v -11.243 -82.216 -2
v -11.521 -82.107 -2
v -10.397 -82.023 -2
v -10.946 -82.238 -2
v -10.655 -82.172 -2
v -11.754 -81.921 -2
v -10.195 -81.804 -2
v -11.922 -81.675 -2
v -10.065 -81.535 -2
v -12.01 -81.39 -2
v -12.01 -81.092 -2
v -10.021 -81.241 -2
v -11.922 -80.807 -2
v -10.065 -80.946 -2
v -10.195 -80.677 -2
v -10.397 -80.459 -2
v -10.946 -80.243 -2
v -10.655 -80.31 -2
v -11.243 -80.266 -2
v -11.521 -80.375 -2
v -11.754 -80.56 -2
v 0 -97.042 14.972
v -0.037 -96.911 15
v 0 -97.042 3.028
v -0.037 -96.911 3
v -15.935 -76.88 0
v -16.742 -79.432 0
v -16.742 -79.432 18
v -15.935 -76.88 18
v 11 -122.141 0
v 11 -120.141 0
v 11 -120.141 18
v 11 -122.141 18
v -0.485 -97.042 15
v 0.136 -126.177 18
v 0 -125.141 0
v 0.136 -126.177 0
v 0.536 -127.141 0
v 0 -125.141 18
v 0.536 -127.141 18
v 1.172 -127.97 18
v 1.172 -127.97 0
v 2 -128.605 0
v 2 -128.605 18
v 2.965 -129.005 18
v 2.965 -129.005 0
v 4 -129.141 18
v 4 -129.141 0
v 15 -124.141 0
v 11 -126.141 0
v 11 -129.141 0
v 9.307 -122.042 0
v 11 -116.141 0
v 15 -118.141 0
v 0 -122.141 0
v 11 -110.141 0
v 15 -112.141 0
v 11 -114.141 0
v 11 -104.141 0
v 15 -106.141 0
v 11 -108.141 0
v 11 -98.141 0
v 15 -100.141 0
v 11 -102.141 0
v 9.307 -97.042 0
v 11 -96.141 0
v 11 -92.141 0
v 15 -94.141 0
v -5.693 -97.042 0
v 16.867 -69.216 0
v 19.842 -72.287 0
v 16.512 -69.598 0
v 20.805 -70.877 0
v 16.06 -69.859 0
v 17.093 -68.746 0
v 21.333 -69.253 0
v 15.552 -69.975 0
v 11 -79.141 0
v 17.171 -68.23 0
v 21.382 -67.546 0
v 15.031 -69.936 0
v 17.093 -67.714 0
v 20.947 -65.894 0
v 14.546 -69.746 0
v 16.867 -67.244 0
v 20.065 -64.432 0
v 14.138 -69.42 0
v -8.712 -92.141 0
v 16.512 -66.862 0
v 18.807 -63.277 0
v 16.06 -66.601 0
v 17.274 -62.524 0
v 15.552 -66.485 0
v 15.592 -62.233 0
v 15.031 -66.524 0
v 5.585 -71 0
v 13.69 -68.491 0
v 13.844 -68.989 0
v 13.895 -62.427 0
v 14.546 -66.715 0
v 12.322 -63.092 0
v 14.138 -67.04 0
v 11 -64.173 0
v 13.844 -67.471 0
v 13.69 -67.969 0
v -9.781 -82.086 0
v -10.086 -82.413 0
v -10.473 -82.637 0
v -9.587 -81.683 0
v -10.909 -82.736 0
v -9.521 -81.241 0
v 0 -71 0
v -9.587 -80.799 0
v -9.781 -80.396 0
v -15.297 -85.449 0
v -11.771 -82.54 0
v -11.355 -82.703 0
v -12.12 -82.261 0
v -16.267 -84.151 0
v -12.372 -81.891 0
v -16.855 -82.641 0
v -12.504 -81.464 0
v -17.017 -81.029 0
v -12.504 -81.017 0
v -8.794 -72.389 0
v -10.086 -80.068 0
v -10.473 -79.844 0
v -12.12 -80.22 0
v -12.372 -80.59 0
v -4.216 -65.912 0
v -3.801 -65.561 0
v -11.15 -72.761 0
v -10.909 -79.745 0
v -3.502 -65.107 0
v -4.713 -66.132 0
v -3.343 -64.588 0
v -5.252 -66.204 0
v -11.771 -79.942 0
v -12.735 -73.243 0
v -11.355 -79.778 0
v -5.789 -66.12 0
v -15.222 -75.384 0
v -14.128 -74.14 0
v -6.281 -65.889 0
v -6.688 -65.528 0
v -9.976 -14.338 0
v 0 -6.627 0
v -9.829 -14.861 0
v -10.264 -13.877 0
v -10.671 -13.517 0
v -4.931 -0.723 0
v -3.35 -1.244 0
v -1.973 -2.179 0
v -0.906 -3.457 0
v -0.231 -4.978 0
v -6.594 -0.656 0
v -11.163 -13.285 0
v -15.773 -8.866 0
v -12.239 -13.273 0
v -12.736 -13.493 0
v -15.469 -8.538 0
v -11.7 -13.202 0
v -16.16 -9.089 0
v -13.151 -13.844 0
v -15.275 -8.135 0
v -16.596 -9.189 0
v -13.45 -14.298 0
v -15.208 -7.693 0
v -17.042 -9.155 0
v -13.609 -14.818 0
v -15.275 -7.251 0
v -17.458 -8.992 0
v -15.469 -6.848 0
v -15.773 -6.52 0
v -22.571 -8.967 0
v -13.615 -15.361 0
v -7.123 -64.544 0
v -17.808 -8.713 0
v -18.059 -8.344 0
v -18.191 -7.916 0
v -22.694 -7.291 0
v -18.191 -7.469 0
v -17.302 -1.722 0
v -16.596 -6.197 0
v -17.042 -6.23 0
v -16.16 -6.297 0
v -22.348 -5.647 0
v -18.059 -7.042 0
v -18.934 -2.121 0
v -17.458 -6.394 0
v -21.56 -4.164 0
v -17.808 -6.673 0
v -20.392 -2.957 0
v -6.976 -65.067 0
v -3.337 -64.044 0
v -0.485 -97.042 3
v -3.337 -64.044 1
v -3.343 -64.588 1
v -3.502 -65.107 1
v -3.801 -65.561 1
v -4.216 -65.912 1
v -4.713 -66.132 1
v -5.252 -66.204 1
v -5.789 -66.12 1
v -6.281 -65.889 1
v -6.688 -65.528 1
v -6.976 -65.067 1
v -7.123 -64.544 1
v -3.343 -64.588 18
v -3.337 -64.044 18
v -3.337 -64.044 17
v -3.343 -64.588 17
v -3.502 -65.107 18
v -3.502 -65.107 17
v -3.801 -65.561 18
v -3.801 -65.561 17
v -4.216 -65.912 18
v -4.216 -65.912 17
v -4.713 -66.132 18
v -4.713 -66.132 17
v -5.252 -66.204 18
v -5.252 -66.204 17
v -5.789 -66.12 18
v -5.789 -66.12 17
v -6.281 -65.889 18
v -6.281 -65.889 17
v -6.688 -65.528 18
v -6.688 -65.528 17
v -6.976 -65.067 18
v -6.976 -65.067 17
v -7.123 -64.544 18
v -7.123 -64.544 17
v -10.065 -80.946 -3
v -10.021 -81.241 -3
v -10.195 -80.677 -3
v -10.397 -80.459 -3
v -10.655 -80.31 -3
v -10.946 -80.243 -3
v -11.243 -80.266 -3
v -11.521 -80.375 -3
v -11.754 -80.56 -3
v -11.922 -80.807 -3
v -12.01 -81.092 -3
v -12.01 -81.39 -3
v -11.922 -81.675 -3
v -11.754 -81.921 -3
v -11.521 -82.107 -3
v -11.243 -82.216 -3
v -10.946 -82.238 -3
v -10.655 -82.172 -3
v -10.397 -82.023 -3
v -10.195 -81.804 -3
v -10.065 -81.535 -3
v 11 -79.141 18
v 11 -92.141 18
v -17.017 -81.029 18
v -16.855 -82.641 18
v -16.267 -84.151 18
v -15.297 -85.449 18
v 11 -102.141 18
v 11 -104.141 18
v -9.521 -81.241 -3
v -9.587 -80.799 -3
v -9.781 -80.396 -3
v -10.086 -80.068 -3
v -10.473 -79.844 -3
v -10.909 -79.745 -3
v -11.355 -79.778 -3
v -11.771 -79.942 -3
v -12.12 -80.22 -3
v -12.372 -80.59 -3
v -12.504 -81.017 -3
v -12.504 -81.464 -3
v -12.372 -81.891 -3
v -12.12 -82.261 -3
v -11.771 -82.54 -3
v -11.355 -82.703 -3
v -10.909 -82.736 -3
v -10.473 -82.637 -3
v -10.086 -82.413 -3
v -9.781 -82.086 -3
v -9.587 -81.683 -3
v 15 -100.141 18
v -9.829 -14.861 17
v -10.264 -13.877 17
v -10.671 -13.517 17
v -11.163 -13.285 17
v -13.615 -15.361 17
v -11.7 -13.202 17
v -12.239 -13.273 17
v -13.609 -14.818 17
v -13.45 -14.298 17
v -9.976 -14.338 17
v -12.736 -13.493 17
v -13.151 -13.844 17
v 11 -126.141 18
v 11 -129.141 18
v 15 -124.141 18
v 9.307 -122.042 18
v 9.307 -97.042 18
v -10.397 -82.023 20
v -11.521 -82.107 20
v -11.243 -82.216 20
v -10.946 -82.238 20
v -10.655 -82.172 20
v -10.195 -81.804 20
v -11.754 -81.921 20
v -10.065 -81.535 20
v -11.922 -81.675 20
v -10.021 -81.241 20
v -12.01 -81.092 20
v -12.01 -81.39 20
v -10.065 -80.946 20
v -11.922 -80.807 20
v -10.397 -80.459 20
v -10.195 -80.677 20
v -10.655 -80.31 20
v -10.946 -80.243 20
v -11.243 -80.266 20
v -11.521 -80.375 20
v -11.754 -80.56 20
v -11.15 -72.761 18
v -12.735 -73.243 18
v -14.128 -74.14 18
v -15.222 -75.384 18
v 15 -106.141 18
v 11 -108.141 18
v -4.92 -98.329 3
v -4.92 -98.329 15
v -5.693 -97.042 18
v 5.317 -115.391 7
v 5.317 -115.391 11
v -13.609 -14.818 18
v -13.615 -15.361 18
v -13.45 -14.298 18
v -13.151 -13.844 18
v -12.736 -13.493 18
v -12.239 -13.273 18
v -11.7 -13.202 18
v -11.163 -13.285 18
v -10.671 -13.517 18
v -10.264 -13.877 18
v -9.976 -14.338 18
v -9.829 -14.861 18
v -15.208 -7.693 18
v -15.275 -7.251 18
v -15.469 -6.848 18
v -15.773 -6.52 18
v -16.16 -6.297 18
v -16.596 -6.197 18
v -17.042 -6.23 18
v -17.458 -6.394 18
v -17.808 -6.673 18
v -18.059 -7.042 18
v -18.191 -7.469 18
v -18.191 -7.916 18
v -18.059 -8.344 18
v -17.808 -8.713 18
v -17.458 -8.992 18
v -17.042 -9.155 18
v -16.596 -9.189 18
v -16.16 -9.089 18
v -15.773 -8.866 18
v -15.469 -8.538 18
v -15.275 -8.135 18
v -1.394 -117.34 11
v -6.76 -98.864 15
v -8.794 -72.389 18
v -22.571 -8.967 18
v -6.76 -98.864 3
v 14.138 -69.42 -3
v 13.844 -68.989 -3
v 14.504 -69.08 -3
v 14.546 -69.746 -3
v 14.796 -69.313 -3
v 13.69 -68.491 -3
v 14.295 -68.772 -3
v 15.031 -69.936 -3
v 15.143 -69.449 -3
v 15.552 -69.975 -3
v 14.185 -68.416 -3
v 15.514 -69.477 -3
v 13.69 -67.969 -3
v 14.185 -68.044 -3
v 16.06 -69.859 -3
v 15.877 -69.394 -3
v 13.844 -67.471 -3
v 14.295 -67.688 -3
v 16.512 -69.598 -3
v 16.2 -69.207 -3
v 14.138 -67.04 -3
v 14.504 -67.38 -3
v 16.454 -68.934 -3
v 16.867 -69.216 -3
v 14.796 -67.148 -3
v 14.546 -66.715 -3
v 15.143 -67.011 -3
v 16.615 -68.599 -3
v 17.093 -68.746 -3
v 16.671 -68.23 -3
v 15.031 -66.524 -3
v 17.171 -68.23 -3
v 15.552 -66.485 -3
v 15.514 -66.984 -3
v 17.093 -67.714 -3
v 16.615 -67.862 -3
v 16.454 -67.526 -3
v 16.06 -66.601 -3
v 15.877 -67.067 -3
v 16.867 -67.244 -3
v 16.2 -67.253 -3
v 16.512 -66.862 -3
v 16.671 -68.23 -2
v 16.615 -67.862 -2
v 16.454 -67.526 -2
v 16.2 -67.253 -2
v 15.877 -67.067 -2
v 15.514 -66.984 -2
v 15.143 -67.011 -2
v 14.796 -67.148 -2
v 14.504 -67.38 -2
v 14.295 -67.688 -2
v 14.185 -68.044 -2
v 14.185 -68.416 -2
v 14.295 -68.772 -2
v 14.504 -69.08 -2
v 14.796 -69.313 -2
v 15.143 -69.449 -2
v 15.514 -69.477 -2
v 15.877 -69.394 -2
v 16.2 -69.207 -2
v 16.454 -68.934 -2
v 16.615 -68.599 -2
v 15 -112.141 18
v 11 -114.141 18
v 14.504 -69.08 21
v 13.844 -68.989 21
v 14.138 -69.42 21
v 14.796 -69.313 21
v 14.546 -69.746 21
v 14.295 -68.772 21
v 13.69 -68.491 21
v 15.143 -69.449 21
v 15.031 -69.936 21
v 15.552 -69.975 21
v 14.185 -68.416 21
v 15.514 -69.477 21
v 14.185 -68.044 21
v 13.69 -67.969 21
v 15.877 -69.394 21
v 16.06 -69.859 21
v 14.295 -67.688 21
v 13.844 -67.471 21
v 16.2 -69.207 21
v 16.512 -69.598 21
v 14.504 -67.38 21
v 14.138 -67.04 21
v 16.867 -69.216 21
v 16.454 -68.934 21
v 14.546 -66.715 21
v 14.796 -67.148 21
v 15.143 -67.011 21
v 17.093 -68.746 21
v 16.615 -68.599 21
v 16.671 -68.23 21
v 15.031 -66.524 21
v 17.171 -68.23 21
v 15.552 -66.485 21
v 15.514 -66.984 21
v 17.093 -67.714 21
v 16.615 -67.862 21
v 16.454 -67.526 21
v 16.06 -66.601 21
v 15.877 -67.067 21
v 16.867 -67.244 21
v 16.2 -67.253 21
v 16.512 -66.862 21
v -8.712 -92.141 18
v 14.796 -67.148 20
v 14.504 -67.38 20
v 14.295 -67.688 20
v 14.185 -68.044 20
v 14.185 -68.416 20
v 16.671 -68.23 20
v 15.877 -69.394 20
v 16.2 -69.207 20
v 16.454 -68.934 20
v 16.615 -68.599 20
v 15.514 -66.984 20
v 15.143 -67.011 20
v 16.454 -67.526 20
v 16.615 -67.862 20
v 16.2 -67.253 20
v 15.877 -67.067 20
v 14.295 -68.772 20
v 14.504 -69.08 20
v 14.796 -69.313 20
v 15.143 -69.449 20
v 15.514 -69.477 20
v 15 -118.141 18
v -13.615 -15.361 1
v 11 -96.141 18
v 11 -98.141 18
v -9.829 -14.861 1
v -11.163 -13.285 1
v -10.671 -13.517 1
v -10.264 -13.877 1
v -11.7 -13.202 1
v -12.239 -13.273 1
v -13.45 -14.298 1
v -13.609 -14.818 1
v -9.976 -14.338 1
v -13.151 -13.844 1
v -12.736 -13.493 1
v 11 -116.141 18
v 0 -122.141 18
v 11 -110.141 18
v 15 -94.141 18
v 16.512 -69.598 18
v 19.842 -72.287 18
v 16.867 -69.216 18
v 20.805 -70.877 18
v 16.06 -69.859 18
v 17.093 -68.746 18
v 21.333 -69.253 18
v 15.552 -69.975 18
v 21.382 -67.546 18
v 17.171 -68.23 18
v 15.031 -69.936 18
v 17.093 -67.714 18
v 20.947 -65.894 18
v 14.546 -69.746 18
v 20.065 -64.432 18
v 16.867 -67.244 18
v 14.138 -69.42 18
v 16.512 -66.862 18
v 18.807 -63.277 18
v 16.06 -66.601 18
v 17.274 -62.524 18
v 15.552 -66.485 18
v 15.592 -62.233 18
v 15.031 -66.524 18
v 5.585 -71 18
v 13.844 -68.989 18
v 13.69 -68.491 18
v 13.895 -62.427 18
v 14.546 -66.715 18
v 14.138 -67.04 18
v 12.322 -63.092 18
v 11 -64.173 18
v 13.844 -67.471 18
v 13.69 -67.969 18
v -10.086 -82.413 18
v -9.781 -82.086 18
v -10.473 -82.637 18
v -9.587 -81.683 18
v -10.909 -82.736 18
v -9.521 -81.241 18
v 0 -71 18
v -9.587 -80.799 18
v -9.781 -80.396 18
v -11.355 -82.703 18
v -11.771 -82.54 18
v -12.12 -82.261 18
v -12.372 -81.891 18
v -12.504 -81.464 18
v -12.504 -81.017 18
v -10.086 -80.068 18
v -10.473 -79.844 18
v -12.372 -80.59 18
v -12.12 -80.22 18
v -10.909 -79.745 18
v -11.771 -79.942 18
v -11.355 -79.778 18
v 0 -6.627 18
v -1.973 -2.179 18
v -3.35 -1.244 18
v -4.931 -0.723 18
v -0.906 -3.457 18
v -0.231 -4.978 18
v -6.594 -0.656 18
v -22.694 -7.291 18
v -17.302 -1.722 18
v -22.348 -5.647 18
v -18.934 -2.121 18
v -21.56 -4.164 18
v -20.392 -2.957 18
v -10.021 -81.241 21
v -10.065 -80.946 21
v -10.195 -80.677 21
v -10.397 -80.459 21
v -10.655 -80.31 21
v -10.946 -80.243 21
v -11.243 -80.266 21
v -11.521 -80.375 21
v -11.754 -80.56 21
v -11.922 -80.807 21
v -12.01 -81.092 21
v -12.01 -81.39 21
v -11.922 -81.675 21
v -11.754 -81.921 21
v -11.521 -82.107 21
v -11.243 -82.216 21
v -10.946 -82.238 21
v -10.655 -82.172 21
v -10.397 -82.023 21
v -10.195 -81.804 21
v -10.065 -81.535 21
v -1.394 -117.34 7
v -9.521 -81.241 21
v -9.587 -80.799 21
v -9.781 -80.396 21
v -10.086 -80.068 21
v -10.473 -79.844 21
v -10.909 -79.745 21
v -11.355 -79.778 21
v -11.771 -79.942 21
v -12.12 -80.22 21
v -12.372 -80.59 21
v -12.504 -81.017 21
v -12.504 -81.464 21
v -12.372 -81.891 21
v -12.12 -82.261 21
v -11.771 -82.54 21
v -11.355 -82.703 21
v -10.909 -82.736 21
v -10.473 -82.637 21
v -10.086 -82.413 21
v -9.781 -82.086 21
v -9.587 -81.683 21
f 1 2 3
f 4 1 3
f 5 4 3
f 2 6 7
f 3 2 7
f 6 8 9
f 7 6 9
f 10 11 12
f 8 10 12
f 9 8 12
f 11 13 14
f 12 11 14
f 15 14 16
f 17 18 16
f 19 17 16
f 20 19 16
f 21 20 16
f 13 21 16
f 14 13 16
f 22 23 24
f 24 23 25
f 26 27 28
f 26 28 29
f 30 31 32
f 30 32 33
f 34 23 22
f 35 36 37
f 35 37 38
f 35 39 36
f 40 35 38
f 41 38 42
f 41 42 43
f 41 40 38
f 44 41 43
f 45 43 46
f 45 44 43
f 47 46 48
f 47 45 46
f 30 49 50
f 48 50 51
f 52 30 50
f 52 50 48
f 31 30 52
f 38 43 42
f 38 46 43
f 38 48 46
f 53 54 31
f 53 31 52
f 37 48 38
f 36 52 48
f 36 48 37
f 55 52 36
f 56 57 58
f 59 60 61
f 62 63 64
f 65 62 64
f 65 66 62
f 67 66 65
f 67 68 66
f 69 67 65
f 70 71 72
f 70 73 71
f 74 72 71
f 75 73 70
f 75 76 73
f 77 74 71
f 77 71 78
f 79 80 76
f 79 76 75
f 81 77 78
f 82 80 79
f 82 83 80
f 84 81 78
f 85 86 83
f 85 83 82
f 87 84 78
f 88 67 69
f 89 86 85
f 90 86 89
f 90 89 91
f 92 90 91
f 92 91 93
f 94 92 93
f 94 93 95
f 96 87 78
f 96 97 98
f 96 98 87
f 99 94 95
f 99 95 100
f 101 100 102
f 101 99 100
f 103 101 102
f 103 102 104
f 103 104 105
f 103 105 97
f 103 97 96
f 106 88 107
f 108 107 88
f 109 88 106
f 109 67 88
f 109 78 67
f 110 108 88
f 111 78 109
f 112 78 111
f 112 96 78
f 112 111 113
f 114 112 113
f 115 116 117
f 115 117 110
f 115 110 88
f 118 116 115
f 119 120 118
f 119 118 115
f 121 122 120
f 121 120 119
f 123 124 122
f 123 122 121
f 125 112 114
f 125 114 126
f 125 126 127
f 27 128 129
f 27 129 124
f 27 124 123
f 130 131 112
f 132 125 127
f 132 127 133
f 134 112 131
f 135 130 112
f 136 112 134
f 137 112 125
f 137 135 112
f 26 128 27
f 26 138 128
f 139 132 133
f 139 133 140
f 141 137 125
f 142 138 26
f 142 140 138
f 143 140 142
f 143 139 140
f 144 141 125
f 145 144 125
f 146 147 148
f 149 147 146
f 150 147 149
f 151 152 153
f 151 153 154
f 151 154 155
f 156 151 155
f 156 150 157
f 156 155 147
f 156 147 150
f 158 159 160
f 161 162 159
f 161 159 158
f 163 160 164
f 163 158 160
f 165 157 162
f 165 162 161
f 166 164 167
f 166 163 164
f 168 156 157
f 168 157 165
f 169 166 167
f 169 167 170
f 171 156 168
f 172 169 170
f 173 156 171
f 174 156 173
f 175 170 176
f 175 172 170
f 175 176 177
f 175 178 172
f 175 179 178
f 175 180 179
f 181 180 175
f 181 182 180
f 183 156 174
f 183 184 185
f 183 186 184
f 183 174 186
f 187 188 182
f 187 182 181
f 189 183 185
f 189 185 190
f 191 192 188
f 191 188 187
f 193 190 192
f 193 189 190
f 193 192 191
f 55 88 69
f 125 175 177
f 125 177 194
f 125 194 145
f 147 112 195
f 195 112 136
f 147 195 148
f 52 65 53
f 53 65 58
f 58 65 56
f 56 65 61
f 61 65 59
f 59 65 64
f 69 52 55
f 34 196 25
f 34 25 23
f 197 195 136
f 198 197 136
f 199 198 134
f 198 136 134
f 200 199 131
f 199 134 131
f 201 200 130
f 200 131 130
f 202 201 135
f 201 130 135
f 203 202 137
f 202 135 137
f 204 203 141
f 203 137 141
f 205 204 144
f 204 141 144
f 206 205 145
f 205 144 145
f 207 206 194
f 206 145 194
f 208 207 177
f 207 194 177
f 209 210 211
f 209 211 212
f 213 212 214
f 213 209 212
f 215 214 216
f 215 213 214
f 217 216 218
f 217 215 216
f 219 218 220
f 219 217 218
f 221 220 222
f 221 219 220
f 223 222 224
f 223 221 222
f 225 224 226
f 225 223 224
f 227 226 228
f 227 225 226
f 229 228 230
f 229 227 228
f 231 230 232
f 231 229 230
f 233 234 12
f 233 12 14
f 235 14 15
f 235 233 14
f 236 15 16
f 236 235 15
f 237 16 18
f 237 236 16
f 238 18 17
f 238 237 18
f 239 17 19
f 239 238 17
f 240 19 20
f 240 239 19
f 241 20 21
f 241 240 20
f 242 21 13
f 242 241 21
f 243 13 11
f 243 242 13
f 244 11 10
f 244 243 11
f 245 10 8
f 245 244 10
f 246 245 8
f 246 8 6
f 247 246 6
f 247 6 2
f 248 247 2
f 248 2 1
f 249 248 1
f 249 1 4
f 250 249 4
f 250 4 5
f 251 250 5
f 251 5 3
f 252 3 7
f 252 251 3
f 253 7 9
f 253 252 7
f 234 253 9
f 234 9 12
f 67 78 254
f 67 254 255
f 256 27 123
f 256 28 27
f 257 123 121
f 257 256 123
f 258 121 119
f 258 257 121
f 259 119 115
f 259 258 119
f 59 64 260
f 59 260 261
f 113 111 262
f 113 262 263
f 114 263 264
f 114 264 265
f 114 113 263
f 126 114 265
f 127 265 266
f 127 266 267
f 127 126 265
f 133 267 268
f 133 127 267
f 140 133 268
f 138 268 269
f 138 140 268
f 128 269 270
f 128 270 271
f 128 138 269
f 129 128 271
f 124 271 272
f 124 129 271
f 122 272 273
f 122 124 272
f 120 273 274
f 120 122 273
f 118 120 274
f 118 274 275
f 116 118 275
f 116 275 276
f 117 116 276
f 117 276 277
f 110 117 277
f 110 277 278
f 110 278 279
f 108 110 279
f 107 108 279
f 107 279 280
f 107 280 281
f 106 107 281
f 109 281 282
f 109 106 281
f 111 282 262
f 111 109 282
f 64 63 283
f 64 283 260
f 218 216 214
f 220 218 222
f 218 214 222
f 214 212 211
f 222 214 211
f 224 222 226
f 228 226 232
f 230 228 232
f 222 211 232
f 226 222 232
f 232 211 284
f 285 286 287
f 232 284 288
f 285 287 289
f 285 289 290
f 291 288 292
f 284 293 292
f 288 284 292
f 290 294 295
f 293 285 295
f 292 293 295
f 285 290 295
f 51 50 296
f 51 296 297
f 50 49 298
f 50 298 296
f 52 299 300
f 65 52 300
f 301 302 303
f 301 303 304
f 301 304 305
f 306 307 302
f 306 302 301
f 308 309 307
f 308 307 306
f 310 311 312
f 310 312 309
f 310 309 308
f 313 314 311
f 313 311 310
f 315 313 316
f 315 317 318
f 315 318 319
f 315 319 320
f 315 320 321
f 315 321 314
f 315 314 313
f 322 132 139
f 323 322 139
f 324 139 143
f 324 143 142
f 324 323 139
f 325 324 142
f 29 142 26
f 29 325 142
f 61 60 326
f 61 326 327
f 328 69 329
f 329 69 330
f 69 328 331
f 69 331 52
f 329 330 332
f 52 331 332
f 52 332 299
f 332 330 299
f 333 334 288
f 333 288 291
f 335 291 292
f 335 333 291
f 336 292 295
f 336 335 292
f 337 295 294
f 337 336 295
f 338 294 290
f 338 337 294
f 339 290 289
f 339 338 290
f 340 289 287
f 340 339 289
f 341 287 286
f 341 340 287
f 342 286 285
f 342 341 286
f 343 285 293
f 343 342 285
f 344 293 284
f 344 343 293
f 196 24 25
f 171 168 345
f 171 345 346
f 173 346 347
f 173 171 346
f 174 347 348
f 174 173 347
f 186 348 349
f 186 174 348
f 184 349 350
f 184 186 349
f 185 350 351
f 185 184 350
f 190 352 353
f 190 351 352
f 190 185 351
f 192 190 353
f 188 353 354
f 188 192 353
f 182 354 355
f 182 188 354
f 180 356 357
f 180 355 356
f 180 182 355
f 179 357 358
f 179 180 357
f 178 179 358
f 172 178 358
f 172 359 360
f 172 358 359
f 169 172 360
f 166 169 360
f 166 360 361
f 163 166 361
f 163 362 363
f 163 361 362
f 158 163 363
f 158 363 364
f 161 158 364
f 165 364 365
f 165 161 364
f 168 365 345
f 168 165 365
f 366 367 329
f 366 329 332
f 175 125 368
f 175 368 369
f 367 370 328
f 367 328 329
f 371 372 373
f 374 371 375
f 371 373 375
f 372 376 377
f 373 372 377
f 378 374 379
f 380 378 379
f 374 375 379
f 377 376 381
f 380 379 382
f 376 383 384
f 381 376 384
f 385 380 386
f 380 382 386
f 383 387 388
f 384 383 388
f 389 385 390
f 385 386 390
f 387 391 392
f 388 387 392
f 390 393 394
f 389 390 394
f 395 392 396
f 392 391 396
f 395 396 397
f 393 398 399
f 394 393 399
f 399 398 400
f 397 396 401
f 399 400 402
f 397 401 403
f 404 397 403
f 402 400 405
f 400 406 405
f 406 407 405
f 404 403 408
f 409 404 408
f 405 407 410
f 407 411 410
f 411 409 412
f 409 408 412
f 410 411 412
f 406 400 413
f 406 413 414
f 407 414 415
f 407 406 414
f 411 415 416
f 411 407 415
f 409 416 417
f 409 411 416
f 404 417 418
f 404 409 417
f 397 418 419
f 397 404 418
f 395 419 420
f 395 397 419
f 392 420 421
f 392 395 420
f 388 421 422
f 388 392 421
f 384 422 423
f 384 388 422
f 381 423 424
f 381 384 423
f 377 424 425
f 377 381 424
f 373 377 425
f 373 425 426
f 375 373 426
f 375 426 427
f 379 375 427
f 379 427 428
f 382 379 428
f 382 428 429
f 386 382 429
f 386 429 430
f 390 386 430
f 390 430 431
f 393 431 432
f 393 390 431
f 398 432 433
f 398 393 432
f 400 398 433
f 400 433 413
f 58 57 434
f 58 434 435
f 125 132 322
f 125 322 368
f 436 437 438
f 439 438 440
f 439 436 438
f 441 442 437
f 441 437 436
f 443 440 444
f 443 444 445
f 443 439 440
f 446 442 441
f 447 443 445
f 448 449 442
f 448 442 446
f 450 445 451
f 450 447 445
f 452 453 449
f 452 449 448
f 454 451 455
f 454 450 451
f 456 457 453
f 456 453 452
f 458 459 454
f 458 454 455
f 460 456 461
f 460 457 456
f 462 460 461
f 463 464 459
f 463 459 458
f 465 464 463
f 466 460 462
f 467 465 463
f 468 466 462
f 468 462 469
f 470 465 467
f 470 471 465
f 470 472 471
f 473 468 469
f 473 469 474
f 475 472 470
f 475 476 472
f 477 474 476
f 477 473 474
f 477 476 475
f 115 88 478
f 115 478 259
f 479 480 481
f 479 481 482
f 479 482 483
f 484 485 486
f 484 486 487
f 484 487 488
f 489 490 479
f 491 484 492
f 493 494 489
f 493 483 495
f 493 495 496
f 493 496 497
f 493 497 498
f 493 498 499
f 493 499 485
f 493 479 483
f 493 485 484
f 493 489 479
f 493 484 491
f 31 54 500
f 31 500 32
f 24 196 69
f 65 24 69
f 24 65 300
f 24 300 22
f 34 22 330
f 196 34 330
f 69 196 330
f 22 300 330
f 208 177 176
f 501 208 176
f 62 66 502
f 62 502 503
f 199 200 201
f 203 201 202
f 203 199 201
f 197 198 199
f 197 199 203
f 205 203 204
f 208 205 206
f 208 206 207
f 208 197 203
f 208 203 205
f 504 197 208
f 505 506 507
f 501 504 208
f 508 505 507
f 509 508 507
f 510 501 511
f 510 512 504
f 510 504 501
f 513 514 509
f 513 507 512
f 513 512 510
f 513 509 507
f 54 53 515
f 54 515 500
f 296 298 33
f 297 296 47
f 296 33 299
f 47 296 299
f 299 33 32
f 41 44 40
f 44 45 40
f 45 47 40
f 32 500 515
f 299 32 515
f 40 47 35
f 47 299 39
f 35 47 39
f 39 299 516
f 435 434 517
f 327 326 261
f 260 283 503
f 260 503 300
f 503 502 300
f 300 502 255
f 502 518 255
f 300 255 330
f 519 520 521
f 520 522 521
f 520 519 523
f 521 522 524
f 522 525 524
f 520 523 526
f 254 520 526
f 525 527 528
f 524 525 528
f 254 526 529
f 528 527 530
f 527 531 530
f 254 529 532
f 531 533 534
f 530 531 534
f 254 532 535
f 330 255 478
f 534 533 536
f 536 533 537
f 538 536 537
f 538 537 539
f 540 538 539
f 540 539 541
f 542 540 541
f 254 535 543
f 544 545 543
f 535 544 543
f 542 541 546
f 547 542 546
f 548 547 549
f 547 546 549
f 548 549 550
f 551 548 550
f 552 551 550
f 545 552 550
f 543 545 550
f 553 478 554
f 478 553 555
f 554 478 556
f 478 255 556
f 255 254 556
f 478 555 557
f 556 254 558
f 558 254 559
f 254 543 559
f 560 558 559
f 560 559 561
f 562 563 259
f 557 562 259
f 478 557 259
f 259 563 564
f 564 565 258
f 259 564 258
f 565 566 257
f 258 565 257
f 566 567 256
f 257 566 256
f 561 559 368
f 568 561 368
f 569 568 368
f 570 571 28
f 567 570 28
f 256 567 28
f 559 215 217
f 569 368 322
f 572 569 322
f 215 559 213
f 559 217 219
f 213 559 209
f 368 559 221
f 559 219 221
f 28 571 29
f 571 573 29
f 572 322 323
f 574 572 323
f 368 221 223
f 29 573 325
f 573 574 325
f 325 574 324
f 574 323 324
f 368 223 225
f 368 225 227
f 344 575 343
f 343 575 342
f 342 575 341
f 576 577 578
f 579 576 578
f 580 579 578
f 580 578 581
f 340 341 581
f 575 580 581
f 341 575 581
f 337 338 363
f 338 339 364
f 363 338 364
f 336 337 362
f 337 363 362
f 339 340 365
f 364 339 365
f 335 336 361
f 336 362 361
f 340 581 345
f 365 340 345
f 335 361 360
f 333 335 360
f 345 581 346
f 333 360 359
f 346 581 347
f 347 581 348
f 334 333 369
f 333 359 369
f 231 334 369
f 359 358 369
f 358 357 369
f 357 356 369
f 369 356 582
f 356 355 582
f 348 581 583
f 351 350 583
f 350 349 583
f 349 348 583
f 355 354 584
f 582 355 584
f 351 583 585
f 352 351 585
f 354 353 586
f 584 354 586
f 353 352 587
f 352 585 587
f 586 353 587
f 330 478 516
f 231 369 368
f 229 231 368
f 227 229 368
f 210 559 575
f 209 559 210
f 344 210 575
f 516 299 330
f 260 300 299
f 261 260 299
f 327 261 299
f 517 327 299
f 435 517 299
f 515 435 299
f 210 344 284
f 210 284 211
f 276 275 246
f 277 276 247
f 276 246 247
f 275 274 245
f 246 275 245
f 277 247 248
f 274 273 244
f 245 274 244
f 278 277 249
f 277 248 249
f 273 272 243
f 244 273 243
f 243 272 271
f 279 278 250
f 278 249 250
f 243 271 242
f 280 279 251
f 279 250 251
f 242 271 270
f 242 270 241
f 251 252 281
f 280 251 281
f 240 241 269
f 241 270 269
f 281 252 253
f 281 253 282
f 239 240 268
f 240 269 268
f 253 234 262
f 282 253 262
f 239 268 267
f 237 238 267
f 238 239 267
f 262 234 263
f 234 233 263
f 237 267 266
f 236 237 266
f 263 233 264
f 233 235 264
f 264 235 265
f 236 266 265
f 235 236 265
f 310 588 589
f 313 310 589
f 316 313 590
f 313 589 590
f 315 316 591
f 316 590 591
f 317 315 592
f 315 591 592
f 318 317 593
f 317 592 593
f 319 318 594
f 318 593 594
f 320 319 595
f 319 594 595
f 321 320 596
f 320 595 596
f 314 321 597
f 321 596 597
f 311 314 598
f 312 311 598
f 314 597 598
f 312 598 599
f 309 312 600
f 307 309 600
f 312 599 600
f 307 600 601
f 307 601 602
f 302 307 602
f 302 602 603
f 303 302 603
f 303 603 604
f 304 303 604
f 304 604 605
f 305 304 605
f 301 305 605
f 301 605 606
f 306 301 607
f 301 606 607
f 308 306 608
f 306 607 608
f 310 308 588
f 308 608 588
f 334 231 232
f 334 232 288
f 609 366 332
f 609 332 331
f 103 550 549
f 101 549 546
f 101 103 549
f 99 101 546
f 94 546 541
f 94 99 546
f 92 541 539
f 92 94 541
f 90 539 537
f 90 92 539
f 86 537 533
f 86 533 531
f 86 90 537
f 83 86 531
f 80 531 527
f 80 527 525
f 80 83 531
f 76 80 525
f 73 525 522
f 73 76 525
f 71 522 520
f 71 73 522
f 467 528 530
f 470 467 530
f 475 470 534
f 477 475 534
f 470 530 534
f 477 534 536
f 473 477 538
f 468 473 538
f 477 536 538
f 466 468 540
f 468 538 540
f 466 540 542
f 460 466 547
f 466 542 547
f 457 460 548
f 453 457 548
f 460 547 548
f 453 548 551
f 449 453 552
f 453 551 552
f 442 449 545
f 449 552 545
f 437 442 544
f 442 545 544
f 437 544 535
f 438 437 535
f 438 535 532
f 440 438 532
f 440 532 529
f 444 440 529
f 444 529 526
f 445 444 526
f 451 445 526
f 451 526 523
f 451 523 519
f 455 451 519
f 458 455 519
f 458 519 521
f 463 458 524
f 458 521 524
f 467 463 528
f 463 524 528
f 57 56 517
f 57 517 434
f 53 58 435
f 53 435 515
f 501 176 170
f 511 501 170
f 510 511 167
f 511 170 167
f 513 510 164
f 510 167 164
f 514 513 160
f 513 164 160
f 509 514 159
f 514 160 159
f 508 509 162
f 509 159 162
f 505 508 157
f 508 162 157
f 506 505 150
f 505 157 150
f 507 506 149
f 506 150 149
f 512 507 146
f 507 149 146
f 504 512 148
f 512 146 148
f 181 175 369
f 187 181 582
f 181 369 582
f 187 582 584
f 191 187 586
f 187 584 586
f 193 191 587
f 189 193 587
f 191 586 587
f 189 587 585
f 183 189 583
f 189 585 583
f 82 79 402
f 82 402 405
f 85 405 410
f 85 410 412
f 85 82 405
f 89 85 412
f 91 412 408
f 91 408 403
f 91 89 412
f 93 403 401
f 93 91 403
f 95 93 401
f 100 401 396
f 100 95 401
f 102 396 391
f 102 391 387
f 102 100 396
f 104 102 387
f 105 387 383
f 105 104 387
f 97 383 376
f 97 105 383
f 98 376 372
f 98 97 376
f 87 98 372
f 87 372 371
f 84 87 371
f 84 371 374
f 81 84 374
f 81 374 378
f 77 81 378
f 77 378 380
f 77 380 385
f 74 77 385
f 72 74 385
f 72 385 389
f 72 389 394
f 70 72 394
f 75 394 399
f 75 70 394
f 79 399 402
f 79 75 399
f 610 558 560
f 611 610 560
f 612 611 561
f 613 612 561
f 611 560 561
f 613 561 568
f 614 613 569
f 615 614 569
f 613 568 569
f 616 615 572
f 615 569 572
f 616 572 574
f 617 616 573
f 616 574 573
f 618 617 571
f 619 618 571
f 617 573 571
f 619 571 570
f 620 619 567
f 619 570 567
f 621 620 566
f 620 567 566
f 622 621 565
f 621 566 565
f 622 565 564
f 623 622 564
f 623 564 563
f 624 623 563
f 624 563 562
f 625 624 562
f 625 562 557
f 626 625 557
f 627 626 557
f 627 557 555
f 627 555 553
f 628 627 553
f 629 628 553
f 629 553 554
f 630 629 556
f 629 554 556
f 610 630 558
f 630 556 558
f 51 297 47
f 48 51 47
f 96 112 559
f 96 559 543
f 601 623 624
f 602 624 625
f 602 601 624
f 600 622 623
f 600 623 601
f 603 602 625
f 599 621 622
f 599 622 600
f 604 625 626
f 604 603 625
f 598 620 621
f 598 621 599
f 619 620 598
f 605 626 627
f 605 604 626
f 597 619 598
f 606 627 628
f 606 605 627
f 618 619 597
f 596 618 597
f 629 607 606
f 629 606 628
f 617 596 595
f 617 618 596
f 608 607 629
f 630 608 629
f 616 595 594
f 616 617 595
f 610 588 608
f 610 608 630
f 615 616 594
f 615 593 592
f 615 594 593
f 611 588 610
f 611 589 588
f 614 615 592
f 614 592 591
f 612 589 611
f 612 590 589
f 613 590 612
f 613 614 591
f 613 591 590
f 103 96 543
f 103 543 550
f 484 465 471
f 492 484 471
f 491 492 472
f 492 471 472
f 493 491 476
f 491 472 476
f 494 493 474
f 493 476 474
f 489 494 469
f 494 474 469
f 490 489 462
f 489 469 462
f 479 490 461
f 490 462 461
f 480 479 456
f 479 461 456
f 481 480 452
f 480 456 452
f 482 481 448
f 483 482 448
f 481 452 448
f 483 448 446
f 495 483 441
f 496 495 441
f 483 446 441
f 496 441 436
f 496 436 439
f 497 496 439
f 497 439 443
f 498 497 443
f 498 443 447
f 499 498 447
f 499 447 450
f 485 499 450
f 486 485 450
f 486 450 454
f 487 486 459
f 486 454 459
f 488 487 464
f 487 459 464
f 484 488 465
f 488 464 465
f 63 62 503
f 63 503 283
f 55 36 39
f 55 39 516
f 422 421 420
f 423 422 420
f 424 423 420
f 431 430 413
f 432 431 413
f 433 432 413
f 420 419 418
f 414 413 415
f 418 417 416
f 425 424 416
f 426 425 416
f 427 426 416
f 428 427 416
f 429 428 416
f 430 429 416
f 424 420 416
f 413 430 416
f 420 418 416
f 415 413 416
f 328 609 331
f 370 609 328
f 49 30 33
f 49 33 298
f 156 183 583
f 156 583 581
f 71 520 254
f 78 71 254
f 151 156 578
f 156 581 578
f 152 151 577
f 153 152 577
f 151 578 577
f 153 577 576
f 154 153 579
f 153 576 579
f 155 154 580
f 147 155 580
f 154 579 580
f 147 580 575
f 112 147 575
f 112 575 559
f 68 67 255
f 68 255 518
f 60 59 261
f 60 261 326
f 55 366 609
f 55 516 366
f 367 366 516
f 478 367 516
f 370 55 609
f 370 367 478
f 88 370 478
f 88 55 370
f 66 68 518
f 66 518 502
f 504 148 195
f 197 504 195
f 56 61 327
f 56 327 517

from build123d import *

# Parameters (mm, degrees)
BOSS_EXTRUDE1_DEPTH     = 18
FILLET1_R               = 6
FILLET2_R               = 6
FILLET3_R               = 4
BOSS_EXTRUDE2_DEPTH     = 18
LPATTERN1_COUNT         = 6
LPATTERN1_PITCH         = 6
CUT_EXTRUDE1_DEPTH      = 24
CUT_EXTRUDE2_DEPTH      = 7
CUT_EXTRUDE3_DEPTH      = 1
CUT_EXTRUDE3_DEPTH_BACK = 24
SKETCH5_R               = 1.5
SKETCH6_R               = 1.5
SKETCH6_R_2             = 1.75
BOSS_EXTRUDE3_DEPTH     = 3
SKETCH7_R               = 1
CUT_EXTRUDE4_DEPTH      = 1
SKETCH8_R               = 1.25
CUT_EXTRUDE5_DEPTH      = 1
CUT_EXTRUDE6_DEPTH      = 1


with BuildPart() as part:
    # Sketch1 → Boss-Extrude1 (new body)
    with BuildSketch(Plane.XY):
        Polygon((0, -71), (-8.794264851, -72.38913139), (-24, -2.38913139), (0, 0), align=None)
        with BuildLine():
            ThreePointArc((11, -64.173420673), (19.477467135, -63.809345165), (19.841542643, -72.2868123))
            Line((19.841542643, -72.2868123), (11, -79.141297469))
            Line((11, -79.141297469), (11, -129.141297469))
            Line((11, -129.141297469), (0, -129.141297469))
            Line((0, -129.141297469), (0, -122.141297469))
            Line((0, -122.141297469), (-8.711760915, -92.141297469))
            Line((-8.711760915, -92.141297469), (-17.830063901, -82.875416472))
            Line((-17.830063901, -82.875416472), (-14.816298261, -73.340364471))
            Line((-14.816298261, -73.340364471), (-8.794264851, -72.38913139))
            Line((-8.794264851, -72.38913139), (0, -71))
            Line((0, -71), (5.584872413, -71))
            Line((5.584872413, -71), (11, -64.173420673))
        make_face()
    extrude(amount=BOSS_EXTRUDE1_DEPTH)

    # Fillet1
    fillet1_edges = [part.edges().sort_by_distance(p)[0] for p in [
        (-24, -2.38913139, 9),
        (0, 0, 9),
    ]]
    fillet(fillet1_edges, radius=FILLET1_R)

    # Fillet2
    fillet2_edges = [part.edges().sort_by_distance(p)[0] for p in [
        (-17.830063901, -82.875416472, 9),
        (-14.816298261, -73.340364471, 9),
    ]]
    fillet(fillet2_edges, radius=FILLET2_R)

    # Fillet3
    fillet3_edges = [part.edges().sort_by_distance(p)[0] for p in [
        (0, -129.141297469, 9),
    ]]
    fillet(fillet3_edges, radius=FILLET3_R)

    # Sketch2 → Boss-Extrude2 (add)
    with BuildSketch(Plane(origin=(0, 0, 0), x_dir=(-1, 0, 0), z_dir=(0, 0, -1))):
        Polygon((-11, -126.141297469), (-11, -122.141297469), (-15, -124.141297469), align=None)
    boss_extrude2 = extrude(amount=-BOSS_EXTRUDE2_DEPTH)

    # LPattern1: Boss-Extrude2 ×6
    with Locations(*[(0, i * LPATTERN1_PITCH, 0) for i in range(1, LPATTERN1_COUNT)]):
        add(boss_extrude2)

    # Sketch3 → Cut-Extrude1 (cut)
    with BuildSketch(Plane.XY.offset(18)):
        Polygon((9.307447599, -122.0415562), (9.307447599, -97.0415562), (-5.692552401, -97.0415562), align=None)
    extrude(amount=-CUT_EXTRUDE1_DEPTH, mode=Mode.SUBTRACT)

    # Sketch4 → Cut-Extrude2 (cut)
    with BuildSketch(Plane(origin=(-32.710466491, -9.498858783, 0), x_dir=(0, 0, 1), z_dir=(-0.9603283669964562, -0.2788717044483353, 0))):
        Polygon((3, -93.056438116), (15, -93.056438116), (11, -112.295752741), (7, -112.295752741), align=None)
    extrude(amount=-CUT_EXTRUDE2_DEPTH, mode=Mode.SUBTRACT)

    # Sketch5 → Cut-Extrude3 (cut, two sides: drawn at the far end of the back side and taken through both)
    with BuildSketch(Plane.XY.offset(18).offset(-CUT_EXTRUDE3_DEPTH_BACK)):
        with Locations((-16.707964916, -7.692885756)):
            Circle(SKETCH5_R)
    extrude(amount=CUT_EXTRUDE3_DEPTH + CUT_EXTRUDE3_DEPTH_BACK, mode=Mode.SUBTRACT)

    # Sketch6 → Boss-Extrude3 (add)
    with BuildSketch(Plane.XY.offset(18)):
        with Locations((-11.020793941, -81.240669864)):
            Circle(SKETCH6_R)
        with Locations((15.420771321, -68.230116487)):
            Circle(SKETCH6_R_2)
    boss_extrude3 = extrude(amount=BOSS_EXTRUDE3_DEPTH)

    # Sketch7 → Cut-Extrude4 (cut)
    with BuildSketch(Plane.XY.offset(21)):
        with Locations((-11.020793941, -81.240669864)):
            Circle(SKETCH7_R)
    cut_extrude4 = extrude(amount=-CUT_EXTRUDE4_DEPTH, mode=Mode.SUBTRACT)

    # Sketch8 → Cut-Extrude5 (cut)
    with BuildSketch(Plane.XY.offset(21)):
        with Locations((15.420771321, -68.230116487)):
            Circle(SKETCH8_R)
    cut_extrude5 = extrude(amount=-CUT_EXTRUDE5_DEPTH, mode=Mode.SUBTRACT)

    # Sketch9 → Cut-Extrude6 (cut)
    with BuildSketch(Plane.XY.offset(18)):
        with BuildLine():
            Line((-9.828696114, -14.861442572), (-3.336598594, -64.043999546))
            ThreePointArc((-3.336598594, -64.043999546), (-4.98006279, -66.187319211), (-7.123382455, -64.543855015))
            Line((-7.123382455, -64.543855015), (-13.615479975, -15.361298042))
            ThreePointArc((-13.615479975, -15.361298042), (-11.97201578, -13.217978377), (-9.828696114, -14.861442572))
        make_face()
    cut_extrude6 = extrude(amount=-CUT_EXTRUDE6_DEPTH, mode=Mode.SUBTRACT)

    # Mirror1: Boss-Extrude3, Cut-Extrude4, Cut-Extrude5, Cut-Extrude6 across plane
    add(boss_extrude3.mirror(Plane.XY.offset(9)))
    add(cut_extrude4.mirror(Plane.XY.offset(9)), mode=Mode.SUBTRACT)
    add(cut_extrude5.mirror(Plane.XY.offset(9)), mode=Mode.SUBTRACT)
    add(cut_extrude6.mirror(Plane.XY.offset(9)), mode=Mode.SUBTRACT)


solid = part.part
